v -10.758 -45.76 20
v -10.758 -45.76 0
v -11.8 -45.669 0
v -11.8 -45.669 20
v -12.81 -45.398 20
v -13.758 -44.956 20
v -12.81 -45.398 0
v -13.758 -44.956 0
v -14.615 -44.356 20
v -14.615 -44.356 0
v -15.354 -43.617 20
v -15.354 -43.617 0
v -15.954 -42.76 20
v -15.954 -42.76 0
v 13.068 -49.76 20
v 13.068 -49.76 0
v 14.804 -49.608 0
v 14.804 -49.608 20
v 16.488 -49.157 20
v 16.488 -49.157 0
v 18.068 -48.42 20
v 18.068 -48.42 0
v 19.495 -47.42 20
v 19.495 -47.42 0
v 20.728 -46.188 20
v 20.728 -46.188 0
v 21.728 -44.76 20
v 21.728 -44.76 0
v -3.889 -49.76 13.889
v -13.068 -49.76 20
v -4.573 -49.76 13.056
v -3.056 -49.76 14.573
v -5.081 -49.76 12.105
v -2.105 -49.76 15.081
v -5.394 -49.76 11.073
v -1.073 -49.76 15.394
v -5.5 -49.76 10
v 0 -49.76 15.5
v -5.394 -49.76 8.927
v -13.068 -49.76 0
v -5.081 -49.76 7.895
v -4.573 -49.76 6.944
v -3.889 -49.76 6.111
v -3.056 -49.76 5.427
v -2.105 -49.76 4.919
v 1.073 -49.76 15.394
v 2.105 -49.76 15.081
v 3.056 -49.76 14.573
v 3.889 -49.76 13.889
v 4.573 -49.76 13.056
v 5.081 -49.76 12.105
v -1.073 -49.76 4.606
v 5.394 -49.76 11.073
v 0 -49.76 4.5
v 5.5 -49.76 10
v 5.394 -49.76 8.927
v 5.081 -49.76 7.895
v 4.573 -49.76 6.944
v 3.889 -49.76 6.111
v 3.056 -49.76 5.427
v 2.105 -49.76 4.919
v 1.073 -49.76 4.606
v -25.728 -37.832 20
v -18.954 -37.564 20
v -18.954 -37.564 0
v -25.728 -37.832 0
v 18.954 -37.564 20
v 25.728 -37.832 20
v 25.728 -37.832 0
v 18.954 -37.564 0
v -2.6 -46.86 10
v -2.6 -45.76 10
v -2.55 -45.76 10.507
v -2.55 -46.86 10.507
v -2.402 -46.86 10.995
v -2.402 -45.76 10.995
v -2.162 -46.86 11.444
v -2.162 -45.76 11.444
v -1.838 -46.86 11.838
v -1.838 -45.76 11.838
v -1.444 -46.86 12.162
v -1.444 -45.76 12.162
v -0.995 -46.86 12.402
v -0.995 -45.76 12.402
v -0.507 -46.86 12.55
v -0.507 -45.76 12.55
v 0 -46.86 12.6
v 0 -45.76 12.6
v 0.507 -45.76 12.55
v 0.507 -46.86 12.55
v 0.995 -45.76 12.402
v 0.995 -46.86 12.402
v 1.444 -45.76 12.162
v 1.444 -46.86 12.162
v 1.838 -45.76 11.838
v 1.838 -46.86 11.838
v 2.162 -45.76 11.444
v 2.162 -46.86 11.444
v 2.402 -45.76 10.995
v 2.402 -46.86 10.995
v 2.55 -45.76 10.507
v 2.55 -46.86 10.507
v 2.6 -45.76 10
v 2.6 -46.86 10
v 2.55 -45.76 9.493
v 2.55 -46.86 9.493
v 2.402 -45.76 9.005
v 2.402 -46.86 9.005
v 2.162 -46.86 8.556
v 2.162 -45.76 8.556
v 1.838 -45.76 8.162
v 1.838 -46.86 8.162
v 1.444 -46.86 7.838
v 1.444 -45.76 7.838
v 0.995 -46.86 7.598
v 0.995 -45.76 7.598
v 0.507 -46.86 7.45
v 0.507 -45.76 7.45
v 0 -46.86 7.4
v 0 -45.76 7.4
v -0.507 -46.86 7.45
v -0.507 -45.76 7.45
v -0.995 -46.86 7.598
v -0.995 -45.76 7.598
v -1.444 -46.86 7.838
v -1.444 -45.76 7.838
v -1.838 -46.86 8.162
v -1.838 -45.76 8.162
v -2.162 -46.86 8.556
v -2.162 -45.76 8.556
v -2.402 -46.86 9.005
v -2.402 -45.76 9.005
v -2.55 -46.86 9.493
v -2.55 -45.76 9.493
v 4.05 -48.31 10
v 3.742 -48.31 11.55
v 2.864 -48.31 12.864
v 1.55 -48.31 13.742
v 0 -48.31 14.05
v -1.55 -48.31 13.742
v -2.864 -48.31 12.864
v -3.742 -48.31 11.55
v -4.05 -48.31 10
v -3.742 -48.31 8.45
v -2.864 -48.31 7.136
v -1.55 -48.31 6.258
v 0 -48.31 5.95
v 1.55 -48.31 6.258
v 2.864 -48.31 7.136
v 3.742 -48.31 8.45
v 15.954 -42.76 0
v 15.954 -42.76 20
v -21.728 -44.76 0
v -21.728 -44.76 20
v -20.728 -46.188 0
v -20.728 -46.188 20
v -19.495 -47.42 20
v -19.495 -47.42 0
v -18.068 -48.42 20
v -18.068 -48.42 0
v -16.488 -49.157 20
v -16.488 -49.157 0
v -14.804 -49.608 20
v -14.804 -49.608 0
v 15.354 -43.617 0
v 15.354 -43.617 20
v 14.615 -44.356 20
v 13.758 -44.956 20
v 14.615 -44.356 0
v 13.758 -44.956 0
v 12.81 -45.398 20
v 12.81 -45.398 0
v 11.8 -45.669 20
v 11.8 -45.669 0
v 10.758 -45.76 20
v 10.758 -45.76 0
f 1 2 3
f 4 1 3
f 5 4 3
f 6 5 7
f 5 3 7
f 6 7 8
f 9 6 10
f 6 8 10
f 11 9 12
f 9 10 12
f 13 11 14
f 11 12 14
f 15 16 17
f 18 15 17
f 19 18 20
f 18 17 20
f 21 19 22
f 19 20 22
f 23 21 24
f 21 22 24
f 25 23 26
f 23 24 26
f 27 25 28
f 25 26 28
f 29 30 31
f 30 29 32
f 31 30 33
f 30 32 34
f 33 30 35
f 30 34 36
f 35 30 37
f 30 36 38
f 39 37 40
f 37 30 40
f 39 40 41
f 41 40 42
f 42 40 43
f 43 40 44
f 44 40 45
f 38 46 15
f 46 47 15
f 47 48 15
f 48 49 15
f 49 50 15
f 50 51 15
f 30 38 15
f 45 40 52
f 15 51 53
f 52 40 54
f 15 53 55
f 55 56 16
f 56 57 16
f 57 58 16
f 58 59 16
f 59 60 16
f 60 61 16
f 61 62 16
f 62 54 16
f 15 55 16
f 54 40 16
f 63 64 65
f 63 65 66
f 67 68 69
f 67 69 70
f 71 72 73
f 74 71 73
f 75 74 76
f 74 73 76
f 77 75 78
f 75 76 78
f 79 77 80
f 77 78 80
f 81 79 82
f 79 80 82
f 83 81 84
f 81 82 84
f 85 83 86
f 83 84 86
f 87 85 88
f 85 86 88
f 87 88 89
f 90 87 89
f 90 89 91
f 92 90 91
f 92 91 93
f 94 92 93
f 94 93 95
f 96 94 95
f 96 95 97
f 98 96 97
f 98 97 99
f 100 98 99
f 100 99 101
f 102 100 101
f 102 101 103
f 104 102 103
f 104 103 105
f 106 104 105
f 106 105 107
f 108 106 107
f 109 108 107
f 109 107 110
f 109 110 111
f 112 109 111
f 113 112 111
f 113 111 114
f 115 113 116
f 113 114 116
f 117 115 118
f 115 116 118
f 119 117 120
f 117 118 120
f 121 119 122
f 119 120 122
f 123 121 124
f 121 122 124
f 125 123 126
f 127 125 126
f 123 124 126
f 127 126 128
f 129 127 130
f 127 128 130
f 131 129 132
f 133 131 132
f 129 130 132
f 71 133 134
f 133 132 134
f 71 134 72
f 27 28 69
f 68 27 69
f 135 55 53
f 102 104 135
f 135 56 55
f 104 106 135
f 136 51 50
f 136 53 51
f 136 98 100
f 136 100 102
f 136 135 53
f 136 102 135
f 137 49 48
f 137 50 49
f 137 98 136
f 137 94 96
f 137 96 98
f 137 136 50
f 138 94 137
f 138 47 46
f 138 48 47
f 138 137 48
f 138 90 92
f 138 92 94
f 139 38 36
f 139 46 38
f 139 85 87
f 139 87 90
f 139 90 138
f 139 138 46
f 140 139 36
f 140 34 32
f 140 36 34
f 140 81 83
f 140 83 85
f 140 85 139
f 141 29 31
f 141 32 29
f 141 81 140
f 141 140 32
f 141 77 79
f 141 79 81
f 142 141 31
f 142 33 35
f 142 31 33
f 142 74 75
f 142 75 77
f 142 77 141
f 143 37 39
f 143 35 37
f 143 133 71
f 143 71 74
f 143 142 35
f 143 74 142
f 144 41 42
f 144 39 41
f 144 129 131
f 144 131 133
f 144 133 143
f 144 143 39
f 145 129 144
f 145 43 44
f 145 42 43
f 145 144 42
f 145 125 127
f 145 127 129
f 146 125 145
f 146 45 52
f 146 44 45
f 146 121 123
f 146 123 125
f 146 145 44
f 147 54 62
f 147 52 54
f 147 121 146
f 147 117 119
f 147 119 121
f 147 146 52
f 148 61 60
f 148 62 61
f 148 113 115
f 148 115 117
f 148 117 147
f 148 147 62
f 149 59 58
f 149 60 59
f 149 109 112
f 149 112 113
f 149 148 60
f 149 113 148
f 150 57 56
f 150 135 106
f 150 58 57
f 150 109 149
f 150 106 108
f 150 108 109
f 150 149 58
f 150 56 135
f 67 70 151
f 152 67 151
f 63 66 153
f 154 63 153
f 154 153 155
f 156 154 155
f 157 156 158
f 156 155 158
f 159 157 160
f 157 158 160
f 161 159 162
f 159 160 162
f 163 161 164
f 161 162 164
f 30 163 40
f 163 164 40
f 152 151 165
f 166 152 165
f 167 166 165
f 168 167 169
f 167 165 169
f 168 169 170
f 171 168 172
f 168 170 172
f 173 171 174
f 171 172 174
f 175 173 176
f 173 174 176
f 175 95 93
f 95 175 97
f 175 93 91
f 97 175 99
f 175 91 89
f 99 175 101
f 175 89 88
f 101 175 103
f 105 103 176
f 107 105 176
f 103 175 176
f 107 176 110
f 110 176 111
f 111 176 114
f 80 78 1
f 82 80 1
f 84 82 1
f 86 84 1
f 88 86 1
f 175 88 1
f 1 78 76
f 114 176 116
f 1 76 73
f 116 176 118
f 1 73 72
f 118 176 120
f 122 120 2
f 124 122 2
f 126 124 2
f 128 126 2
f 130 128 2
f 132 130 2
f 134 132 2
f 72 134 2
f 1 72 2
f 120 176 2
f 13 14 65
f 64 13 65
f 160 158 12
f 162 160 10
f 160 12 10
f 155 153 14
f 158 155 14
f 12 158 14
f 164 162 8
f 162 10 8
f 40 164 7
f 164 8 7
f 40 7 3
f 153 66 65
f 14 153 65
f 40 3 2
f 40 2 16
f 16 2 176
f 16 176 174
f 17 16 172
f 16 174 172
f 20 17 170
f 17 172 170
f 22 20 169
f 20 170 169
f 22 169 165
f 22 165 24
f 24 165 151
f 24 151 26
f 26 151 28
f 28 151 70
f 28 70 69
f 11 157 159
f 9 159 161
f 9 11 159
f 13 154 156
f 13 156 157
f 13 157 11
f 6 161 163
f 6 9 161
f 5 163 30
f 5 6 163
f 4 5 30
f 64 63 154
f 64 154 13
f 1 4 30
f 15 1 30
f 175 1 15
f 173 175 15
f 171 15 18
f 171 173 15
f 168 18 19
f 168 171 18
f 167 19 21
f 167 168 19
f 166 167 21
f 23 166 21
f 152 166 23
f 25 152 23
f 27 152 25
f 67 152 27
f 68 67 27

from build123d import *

# Parameters (mm, degrees)
F1_DEPTH = 20
F2_R     = 5.5
F3_DEPTH = 3.5
F3_TAPER = 45
F4_R     = 2.6
F5_DEPTH = 2


with BuildPart() as f1:
    # F0 (on Top) → F1 (new body)
    with BuildSketch(Plane.XY):
        with BuildLine():
            Line((21.7278633238, -44.76), (25.7278633238, -37.8317967697))
            Line((25.7278633238, -37.8317967697), (18.9543606319, -37.5638475773))
            Line((18.9543606319, -37.5638475773), (15.9543606319, -42.76))
            ThreePointArc((15.9543606319, -42.76), (13.7582082092, -44.9561524227), (10.7582082092, -45.76))
            Line((10.7582082092, -45.76), (10, -45.76))
            Line((10, -45.76), (-10, -45.76))
            Line((-10, -45.76), (-10.7582082092, -45.76))
            ThreePointArc((-10.7582082092, -45.76), (-13.7582082092, -44.9561524227), (-15.9543606319, -42.76))
            Line((-15.9543606319, -42.76), (-18.9543606319, -37.5638475773))
            Line((-18.9543606319, -37.5638475773), (-25.7278633238, -37.8317967697))
            Line((-25.7278633238, -37.8317967697), (-21.7278633238, -44.76))
            ThreePointArc((-21.7278633238, -44.76), (-18.0676092859, -48.4202540378), (-13.0676092859, -49.76))
            Line((-13.0676092859, -49.76), (13.0676092859, -49.76))
            ThreePointArc((13.0676092859, -49.76), (18.0676092859, -48.4202540378), (21.7278633238, -44.76))
        make_face()
    extrude(amount=F1_DEPTH)

    # F2 (on face) → F3 (cut)
    with BuildSketch(Plane.XZ.offset(49.76)):
        with Locations((0, 10)):
            Circle(F2_R)
    extrude(amount=-F3_DEPTH, taper=F3_TAPER, mode=Mode.SUBTRACT)

    # F4 (on face) → F5 (cut)
    with BuildSketch(Plane(origin=(0, -45.76, 0), x_dir=(-1, 0, 0), z_dir=(0, 1, 0))):
        with Locations((0, 10)):
            Circle(F4_R)
    extrude(amount=-F5_DEPTH, mode=Mode.SUBTRACT)


solid = f1.part
